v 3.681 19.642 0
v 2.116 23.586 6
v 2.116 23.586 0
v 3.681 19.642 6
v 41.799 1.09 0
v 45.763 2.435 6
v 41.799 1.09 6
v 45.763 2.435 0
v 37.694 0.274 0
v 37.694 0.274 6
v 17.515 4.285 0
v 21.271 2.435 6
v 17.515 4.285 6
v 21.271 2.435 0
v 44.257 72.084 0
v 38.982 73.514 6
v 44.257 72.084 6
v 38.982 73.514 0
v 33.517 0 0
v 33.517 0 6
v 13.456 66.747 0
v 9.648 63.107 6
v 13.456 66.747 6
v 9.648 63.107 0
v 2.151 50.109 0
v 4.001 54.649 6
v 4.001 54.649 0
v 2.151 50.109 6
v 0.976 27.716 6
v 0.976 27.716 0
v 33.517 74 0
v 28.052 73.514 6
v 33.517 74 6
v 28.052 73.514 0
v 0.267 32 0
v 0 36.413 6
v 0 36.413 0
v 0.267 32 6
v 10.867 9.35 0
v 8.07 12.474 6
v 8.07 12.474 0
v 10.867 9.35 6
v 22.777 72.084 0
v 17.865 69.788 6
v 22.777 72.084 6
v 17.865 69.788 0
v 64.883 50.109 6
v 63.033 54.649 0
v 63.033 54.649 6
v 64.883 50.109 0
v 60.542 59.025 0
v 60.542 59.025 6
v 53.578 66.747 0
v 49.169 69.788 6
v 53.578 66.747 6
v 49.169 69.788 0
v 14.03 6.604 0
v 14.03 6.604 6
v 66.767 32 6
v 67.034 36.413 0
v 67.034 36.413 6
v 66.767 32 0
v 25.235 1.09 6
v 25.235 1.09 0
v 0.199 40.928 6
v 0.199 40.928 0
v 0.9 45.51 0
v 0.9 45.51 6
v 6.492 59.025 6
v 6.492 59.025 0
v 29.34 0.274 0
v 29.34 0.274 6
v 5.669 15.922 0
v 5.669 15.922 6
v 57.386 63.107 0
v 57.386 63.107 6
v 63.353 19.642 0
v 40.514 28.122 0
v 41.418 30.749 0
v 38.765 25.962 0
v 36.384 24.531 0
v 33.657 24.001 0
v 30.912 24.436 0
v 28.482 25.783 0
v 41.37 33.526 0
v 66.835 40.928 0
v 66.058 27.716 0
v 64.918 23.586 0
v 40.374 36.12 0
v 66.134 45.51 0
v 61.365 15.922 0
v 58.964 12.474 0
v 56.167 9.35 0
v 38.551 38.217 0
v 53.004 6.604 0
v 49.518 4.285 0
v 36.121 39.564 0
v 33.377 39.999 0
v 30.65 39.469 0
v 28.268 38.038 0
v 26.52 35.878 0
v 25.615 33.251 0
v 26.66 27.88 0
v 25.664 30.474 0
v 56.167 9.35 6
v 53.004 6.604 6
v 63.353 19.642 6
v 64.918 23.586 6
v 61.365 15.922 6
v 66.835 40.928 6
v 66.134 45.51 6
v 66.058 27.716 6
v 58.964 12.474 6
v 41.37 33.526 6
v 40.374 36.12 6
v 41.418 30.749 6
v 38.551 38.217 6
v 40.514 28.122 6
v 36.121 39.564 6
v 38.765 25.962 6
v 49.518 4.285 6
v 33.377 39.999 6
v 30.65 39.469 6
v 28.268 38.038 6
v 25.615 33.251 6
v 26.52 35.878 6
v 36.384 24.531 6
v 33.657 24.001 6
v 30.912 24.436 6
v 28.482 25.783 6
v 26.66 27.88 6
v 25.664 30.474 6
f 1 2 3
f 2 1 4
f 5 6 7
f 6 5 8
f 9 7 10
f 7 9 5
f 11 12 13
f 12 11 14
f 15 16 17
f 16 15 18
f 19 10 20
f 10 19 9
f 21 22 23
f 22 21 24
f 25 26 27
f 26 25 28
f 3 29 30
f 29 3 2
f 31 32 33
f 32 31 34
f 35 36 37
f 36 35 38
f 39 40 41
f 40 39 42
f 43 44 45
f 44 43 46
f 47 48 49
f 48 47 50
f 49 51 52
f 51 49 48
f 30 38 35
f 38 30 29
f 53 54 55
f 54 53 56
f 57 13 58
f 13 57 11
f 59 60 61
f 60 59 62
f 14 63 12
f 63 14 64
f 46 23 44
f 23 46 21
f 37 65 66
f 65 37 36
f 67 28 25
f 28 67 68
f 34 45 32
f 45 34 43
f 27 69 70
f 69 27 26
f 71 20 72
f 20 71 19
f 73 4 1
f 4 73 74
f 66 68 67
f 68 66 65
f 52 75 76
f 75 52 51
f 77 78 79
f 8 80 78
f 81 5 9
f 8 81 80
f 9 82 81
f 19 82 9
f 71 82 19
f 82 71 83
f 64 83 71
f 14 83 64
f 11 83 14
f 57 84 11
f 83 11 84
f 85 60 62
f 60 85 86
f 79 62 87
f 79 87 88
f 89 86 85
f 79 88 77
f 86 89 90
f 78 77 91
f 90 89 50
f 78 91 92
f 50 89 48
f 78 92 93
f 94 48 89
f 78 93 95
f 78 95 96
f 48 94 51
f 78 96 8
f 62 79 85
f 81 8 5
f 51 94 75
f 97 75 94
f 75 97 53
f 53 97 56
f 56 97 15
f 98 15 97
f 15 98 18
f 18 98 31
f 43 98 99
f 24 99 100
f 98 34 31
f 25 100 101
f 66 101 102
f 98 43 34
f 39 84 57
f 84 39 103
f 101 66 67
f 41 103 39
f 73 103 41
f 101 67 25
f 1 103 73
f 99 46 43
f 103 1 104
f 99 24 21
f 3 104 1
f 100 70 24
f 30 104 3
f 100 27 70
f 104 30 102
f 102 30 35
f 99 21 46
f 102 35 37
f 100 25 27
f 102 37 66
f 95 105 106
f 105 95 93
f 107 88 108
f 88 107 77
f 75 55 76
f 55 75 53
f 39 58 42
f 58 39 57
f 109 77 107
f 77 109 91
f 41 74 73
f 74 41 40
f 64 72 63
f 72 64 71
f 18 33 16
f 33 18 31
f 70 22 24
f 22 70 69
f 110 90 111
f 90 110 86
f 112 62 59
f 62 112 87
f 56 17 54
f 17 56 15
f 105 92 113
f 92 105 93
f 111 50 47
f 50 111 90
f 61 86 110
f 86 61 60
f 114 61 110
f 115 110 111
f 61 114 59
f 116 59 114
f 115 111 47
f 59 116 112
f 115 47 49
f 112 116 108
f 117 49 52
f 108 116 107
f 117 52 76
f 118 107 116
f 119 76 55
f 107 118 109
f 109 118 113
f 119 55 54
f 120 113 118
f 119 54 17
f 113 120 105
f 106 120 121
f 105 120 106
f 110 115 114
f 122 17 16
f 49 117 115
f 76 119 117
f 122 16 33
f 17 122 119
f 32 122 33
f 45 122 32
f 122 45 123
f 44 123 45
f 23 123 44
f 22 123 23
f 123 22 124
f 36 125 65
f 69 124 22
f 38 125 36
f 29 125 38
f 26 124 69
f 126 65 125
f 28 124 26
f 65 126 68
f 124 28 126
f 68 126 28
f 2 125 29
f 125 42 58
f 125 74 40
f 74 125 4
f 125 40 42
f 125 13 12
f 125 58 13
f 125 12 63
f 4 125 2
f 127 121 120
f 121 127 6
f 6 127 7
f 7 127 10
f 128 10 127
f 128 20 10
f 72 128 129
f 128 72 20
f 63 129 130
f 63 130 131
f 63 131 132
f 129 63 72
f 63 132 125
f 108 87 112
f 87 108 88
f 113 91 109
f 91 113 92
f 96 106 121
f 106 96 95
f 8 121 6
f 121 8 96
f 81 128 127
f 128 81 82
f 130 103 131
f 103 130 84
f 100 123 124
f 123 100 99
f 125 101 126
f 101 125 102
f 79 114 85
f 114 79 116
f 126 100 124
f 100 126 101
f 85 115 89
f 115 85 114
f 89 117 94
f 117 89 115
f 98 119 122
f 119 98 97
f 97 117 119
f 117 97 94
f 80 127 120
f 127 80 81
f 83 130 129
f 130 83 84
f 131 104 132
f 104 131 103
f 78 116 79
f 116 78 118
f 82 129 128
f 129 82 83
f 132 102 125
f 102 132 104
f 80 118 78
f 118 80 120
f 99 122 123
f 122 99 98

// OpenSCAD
$fn = 32;

// ----------------------------------------------------------------------
// Cam plate: single_lobe cam, base R32
// ----------------------------------------------------------------------

// --- parameters (mm) ---
base_r = 32;              // base circle radius
lobe_h = 10;              // cam lobe rise
bore_r = 8;               // shaft bore radius
plate_t = 6;              // plate thickness, Z (extrusion height)

profile = [[66.767, 32], [67.034, 36.413], [66.835, 40.928], [66.134, 45.51], [64.883, 50.109], [63.033, 54.649], [60.542, 59.025], [57.386, 63.107], [53.578, 66.747], [49.169, 69.788], [44.257, 72.084], [38.982, 73.514], [33.517, 74], [28.052, 73.514], [22.777, 72.084], [17.865, 69.788], [13.456, 66.747], [9.648, 63.107], [6.492, 59.025], [4.001, 54.649], [2.151, 50.109], [0.9, 45.51], [0.199, 40.928], [0, 36.413], [0.267, 32], [0.976, 27.716], [2.116, 23.586], [3.681, 19.642], [5.669, 15.922], [8.07, 12.474], [10.867, 9.35], [14.03, 6.604], [17.515, 4.285], [21.271, 2.435], [25.235, 1.09], [29.34, 0.274], [33.517, 0], [37.694, 0.274], [41.799, 1.09], [45.763, 2.435], [49.518, 4.285], [53.004, 6.604], [56.167, 9.35], [58.964, 12.474], [61.365, 15.922], [63.353, 19.642], [64.918, 23.586], [66.058, 27.716]];  // primary outline, 48 points, counter clockwise
void_1 = [[41.37, 33.526], [40.374, 36.12], [38.551, 38.217], [36.121, 39.564], [33.377, 39.999], [30.65, 39.469], [28.268, 38.038], [26.52, 35.878], [25.615, 33.251], [25.664, 30.474], [26.66, 27.88], [28.482, 25.783], [30.912, 24.436], [33.657, 24.001], [36.384, 24.531], [38.765, 25.962], [40.514, 28.122], [41.418, 30.749]];  // shaft bore, 18 points

// --- the one profile operation ---
difference() {
  linear_extrude(height = plate_t) polygon(points = profile);
  translate([0, 0, -1])
    linear_extrude(height = plate_t + 2) polygon(points = void_1);
}
